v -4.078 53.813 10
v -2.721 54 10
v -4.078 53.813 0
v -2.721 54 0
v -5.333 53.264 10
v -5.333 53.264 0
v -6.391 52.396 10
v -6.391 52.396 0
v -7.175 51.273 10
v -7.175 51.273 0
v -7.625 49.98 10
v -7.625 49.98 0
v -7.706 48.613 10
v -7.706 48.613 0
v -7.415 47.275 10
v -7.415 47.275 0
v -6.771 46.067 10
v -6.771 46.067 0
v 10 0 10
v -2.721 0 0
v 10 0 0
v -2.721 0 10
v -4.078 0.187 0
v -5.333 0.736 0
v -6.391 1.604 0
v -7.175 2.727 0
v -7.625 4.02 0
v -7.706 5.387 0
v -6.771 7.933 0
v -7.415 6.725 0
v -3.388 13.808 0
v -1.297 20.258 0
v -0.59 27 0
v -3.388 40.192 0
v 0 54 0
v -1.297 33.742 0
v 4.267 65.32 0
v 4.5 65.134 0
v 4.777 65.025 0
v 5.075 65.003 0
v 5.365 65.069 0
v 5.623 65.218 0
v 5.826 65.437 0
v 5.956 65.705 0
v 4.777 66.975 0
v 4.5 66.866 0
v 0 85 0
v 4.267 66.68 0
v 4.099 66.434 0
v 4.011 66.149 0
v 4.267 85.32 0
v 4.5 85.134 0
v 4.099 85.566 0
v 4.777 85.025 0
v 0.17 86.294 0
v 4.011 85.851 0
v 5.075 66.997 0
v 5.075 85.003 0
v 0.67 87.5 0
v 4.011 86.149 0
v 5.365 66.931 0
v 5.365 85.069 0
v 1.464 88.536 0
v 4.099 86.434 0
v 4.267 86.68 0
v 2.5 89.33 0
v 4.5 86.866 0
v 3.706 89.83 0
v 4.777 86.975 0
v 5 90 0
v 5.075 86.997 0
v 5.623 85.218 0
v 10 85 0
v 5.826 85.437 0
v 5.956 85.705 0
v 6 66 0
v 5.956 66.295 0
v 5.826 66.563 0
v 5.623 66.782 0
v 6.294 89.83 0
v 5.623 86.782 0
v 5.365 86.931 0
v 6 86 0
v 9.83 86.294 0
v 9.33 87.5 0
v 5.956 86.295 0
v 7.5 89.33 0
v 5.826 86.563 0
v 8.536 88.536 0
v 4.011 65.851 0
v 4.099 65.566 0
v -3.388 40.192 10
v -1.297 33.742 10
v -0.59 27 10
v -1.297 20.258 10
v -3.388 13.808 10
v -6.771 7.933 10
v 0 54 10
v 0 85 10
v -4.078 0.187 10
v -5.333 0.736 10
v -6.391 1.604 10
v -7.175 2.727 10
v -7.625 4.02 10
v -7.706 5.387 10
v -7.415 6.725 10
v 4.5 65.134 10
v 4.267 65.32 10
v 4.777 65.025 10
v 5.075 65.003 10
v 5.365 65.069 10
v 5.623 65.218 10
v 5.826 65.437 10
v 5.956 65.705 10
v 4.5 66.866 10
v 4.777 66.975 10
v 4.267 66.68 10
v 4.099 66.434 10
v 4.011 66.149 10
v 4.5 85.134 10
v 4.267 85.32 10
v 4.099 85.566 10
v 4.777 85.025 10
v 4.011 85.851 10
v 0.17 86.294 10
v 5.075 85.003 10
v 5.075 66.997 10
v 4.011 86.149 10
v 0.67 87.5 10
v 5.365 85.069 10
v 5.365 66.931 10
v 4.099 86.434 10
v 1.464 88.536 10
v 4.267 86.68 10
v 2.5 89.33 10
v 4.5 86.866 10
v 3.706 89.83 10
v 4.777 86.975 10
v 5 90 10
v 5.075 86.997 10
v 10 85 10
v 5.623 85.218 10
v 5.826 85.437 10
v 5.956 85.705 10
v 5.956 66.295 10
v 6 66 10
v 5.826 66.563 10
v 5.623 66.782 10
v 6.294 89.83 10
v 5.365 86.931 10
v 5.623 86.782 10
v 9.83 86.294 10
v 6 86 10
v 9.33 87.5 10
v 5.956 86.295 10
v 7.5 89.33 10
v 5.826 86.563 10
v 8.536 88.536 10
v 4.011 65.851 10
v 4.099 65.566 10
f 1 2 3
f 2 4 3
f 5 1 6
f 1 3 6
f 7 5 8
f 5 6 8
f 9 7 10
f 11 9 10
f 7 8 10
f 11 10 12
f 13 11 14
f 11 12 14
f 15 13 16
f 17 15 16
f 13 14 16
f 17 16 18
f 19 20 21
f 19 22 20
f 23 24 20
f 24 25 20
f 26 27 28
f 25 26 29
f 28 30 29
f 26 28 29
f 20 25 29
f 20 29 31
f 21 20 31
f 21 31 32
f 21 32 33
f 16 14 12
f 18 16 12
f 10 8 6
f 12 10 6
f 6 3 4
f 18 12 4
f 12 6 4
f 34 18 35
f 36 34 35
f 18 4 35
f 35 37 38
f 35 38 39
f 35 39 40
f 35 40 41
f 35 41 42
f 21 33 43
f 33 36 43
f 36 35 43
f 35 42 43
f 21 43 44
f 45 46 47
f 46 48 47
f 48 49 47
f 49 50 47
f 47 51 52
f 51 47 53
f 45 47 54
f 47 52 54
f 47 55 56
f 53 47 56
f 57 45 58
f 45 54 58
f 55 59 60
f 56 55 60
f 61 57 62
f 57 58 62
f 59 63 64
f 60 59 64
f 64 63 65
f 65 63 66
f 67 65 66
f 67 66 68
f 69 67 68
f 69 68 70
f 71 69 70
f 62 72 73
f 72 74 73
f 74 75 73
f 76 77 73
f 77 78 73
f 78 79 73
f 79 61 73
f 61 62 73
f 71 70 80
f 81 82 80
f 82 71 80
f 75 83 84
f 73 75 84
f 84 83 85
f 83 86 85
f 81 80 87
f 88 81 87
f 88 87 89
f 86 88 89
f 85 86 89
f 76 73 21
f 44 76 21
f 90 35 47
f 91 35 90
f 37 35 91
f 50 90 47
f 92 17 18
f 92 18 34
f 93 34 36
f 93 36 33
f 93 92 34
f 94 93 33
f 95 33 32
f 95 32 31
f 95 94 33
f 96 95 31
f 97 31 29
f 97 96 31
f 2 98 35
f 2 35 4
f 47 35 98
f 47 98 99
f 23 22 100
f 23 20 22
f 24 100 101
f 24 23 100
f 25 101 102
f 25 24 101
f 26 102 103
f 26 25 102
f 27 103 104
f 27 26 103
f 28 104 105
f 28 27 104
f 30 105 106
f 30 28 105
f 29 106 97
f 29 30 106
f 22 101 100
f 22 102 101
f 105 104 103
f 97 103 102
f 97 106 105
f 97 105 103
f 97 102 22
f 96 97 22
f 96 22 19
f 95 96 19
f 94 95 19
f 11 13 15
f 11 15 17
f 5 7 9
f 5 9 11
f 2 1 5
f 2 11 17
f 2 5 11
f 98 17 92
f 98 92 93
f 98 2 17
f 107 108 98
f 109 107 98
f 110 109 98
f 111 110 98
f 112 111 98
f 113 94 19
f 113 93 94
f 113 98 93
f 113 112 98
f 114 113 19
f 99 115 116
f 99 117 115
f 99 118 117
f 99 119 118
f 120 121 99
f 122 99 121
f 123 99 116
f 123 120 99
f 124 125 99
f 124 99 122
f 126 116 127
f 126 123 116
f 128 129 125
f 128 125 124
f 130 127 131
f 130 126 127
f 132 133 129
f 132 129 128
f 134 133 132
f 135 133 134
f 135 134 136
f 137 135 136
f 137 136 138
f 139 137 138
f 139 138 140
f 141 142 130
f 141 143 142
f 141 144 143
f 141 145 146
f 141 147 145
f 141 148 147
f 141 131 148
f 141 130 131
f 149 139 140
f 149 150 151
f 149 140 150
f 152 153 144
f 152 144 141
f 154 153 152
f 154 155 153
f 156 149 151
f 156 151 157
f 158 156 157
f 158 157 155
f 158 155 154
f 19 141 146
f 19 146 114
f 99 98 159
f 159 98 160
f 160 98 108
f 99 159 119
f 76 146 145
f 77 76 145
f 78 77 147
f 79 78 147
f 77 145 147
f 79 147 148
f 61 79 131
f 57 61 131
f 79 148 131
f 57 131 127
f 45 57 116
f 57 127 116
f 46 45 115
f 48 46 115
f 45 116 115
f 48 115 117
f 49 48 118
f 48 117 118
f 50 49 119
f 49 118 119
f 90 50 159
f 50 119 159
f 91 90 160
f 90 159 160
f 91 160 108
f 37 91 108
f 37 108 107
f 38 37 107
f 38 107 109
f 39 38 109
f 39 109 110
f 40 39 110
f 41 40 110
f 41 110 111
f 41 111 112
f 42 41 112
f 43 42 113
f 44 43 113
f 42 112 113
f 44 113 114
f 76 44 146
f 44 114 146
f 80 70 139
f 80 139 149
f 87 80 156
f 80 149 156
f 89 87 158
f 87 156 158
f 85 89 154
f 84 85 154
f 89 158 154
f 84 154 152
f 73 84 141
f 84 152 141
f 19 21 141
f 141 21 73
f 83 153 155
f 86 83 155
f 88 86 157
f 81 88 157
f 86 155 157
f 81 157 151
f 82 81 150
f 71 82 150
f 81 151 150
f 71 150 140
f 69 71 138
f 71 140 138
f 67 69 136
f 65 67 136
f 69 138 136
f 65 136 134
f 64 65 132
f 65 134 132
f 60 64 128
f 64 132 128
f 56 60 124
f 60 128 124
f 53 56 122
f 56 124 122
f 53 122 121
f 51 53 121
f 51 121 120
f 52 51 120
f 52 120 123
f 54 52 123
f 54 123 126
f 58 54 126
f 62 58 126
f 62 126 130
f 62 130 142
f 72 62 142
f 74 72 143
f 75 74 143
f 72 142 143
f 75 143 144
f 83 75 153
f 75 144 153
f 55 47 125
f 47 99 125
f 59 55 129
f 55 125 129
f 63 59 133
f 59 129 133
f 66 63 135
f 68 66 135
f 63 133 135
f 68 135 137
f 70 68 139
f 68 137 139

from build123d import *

# Parameters (mm, degrees)
ESQUISSE1_W             = 10
ESQUISSE1_H             = 90
BOSS_EXTRU_1_DEPTH      = 10
ESQUISSE2_R             = 1
ENL_V_MAT_EXTRU_1_DEPTH = 10
CONG_1_R                = 5
BOSS_EXTRU_2_DEPTH      = 10
CONG_2_R                = 5


with BuildPart() as part:
    # Esquisse1 → Boss.-Extru.1 (new body)
    with BuildSketch(Plane.XY):
        with Locations((5, 45)):
            Rectangle(ESQUISSE1_W, ESQUISSE1_H)
    extrude(amount=BOSS_EXTRU_1_DEPTH)

    # Esquisse2 → Enlèv. mat.-Extru.1 (cut)
    with BuildSketch(Plane.XY.offset(10)):
        with Locations((5, 66)):
            Circle(ESQUISSE2_R)
        with Locations((5, 86)):
            Circle(ESQUISSE2_R)
    extrude(amount=-ENL_V_MAT_EXTRU_1_DEPTH, mode=Mode.SUBTRACT)

    # Congé1
    cong_1_edges = [part.edges().sort_by_distance(p)[0] for p in [
        (10, 90, 5),
        (0, 90, 5),
    ]]
    fillet(cong_1_edges, radius=CONG_1_R - 0.0001)  # a hair under: the kernel refuses the full size

    # Esquisse3 → Boss.-Extru.2 (add)
    with BuildSketch(Plane.XY.offset(10)):
        with BuildLine():
            Line((0, 0), (0, 54))
            Line((0, 54), (-15, 54))
            ThreePointArc((-15, 54), (-0.590052515, 27), (-15, 0))
            Line((-15, 0), (0, 0))
        make_face()
    extrude(amount=-BOSS_EXTRU_2_DEPTH)

    # Congé2
    cong_2_edges = [part.edges().sort_by_distance(p)[0] for p in [
        (-15, 0, 5),
        (-15, 54, 5),
    ]]
    fillet(cong_2_edges, radius=CONG_2_R)


solid = part.part
